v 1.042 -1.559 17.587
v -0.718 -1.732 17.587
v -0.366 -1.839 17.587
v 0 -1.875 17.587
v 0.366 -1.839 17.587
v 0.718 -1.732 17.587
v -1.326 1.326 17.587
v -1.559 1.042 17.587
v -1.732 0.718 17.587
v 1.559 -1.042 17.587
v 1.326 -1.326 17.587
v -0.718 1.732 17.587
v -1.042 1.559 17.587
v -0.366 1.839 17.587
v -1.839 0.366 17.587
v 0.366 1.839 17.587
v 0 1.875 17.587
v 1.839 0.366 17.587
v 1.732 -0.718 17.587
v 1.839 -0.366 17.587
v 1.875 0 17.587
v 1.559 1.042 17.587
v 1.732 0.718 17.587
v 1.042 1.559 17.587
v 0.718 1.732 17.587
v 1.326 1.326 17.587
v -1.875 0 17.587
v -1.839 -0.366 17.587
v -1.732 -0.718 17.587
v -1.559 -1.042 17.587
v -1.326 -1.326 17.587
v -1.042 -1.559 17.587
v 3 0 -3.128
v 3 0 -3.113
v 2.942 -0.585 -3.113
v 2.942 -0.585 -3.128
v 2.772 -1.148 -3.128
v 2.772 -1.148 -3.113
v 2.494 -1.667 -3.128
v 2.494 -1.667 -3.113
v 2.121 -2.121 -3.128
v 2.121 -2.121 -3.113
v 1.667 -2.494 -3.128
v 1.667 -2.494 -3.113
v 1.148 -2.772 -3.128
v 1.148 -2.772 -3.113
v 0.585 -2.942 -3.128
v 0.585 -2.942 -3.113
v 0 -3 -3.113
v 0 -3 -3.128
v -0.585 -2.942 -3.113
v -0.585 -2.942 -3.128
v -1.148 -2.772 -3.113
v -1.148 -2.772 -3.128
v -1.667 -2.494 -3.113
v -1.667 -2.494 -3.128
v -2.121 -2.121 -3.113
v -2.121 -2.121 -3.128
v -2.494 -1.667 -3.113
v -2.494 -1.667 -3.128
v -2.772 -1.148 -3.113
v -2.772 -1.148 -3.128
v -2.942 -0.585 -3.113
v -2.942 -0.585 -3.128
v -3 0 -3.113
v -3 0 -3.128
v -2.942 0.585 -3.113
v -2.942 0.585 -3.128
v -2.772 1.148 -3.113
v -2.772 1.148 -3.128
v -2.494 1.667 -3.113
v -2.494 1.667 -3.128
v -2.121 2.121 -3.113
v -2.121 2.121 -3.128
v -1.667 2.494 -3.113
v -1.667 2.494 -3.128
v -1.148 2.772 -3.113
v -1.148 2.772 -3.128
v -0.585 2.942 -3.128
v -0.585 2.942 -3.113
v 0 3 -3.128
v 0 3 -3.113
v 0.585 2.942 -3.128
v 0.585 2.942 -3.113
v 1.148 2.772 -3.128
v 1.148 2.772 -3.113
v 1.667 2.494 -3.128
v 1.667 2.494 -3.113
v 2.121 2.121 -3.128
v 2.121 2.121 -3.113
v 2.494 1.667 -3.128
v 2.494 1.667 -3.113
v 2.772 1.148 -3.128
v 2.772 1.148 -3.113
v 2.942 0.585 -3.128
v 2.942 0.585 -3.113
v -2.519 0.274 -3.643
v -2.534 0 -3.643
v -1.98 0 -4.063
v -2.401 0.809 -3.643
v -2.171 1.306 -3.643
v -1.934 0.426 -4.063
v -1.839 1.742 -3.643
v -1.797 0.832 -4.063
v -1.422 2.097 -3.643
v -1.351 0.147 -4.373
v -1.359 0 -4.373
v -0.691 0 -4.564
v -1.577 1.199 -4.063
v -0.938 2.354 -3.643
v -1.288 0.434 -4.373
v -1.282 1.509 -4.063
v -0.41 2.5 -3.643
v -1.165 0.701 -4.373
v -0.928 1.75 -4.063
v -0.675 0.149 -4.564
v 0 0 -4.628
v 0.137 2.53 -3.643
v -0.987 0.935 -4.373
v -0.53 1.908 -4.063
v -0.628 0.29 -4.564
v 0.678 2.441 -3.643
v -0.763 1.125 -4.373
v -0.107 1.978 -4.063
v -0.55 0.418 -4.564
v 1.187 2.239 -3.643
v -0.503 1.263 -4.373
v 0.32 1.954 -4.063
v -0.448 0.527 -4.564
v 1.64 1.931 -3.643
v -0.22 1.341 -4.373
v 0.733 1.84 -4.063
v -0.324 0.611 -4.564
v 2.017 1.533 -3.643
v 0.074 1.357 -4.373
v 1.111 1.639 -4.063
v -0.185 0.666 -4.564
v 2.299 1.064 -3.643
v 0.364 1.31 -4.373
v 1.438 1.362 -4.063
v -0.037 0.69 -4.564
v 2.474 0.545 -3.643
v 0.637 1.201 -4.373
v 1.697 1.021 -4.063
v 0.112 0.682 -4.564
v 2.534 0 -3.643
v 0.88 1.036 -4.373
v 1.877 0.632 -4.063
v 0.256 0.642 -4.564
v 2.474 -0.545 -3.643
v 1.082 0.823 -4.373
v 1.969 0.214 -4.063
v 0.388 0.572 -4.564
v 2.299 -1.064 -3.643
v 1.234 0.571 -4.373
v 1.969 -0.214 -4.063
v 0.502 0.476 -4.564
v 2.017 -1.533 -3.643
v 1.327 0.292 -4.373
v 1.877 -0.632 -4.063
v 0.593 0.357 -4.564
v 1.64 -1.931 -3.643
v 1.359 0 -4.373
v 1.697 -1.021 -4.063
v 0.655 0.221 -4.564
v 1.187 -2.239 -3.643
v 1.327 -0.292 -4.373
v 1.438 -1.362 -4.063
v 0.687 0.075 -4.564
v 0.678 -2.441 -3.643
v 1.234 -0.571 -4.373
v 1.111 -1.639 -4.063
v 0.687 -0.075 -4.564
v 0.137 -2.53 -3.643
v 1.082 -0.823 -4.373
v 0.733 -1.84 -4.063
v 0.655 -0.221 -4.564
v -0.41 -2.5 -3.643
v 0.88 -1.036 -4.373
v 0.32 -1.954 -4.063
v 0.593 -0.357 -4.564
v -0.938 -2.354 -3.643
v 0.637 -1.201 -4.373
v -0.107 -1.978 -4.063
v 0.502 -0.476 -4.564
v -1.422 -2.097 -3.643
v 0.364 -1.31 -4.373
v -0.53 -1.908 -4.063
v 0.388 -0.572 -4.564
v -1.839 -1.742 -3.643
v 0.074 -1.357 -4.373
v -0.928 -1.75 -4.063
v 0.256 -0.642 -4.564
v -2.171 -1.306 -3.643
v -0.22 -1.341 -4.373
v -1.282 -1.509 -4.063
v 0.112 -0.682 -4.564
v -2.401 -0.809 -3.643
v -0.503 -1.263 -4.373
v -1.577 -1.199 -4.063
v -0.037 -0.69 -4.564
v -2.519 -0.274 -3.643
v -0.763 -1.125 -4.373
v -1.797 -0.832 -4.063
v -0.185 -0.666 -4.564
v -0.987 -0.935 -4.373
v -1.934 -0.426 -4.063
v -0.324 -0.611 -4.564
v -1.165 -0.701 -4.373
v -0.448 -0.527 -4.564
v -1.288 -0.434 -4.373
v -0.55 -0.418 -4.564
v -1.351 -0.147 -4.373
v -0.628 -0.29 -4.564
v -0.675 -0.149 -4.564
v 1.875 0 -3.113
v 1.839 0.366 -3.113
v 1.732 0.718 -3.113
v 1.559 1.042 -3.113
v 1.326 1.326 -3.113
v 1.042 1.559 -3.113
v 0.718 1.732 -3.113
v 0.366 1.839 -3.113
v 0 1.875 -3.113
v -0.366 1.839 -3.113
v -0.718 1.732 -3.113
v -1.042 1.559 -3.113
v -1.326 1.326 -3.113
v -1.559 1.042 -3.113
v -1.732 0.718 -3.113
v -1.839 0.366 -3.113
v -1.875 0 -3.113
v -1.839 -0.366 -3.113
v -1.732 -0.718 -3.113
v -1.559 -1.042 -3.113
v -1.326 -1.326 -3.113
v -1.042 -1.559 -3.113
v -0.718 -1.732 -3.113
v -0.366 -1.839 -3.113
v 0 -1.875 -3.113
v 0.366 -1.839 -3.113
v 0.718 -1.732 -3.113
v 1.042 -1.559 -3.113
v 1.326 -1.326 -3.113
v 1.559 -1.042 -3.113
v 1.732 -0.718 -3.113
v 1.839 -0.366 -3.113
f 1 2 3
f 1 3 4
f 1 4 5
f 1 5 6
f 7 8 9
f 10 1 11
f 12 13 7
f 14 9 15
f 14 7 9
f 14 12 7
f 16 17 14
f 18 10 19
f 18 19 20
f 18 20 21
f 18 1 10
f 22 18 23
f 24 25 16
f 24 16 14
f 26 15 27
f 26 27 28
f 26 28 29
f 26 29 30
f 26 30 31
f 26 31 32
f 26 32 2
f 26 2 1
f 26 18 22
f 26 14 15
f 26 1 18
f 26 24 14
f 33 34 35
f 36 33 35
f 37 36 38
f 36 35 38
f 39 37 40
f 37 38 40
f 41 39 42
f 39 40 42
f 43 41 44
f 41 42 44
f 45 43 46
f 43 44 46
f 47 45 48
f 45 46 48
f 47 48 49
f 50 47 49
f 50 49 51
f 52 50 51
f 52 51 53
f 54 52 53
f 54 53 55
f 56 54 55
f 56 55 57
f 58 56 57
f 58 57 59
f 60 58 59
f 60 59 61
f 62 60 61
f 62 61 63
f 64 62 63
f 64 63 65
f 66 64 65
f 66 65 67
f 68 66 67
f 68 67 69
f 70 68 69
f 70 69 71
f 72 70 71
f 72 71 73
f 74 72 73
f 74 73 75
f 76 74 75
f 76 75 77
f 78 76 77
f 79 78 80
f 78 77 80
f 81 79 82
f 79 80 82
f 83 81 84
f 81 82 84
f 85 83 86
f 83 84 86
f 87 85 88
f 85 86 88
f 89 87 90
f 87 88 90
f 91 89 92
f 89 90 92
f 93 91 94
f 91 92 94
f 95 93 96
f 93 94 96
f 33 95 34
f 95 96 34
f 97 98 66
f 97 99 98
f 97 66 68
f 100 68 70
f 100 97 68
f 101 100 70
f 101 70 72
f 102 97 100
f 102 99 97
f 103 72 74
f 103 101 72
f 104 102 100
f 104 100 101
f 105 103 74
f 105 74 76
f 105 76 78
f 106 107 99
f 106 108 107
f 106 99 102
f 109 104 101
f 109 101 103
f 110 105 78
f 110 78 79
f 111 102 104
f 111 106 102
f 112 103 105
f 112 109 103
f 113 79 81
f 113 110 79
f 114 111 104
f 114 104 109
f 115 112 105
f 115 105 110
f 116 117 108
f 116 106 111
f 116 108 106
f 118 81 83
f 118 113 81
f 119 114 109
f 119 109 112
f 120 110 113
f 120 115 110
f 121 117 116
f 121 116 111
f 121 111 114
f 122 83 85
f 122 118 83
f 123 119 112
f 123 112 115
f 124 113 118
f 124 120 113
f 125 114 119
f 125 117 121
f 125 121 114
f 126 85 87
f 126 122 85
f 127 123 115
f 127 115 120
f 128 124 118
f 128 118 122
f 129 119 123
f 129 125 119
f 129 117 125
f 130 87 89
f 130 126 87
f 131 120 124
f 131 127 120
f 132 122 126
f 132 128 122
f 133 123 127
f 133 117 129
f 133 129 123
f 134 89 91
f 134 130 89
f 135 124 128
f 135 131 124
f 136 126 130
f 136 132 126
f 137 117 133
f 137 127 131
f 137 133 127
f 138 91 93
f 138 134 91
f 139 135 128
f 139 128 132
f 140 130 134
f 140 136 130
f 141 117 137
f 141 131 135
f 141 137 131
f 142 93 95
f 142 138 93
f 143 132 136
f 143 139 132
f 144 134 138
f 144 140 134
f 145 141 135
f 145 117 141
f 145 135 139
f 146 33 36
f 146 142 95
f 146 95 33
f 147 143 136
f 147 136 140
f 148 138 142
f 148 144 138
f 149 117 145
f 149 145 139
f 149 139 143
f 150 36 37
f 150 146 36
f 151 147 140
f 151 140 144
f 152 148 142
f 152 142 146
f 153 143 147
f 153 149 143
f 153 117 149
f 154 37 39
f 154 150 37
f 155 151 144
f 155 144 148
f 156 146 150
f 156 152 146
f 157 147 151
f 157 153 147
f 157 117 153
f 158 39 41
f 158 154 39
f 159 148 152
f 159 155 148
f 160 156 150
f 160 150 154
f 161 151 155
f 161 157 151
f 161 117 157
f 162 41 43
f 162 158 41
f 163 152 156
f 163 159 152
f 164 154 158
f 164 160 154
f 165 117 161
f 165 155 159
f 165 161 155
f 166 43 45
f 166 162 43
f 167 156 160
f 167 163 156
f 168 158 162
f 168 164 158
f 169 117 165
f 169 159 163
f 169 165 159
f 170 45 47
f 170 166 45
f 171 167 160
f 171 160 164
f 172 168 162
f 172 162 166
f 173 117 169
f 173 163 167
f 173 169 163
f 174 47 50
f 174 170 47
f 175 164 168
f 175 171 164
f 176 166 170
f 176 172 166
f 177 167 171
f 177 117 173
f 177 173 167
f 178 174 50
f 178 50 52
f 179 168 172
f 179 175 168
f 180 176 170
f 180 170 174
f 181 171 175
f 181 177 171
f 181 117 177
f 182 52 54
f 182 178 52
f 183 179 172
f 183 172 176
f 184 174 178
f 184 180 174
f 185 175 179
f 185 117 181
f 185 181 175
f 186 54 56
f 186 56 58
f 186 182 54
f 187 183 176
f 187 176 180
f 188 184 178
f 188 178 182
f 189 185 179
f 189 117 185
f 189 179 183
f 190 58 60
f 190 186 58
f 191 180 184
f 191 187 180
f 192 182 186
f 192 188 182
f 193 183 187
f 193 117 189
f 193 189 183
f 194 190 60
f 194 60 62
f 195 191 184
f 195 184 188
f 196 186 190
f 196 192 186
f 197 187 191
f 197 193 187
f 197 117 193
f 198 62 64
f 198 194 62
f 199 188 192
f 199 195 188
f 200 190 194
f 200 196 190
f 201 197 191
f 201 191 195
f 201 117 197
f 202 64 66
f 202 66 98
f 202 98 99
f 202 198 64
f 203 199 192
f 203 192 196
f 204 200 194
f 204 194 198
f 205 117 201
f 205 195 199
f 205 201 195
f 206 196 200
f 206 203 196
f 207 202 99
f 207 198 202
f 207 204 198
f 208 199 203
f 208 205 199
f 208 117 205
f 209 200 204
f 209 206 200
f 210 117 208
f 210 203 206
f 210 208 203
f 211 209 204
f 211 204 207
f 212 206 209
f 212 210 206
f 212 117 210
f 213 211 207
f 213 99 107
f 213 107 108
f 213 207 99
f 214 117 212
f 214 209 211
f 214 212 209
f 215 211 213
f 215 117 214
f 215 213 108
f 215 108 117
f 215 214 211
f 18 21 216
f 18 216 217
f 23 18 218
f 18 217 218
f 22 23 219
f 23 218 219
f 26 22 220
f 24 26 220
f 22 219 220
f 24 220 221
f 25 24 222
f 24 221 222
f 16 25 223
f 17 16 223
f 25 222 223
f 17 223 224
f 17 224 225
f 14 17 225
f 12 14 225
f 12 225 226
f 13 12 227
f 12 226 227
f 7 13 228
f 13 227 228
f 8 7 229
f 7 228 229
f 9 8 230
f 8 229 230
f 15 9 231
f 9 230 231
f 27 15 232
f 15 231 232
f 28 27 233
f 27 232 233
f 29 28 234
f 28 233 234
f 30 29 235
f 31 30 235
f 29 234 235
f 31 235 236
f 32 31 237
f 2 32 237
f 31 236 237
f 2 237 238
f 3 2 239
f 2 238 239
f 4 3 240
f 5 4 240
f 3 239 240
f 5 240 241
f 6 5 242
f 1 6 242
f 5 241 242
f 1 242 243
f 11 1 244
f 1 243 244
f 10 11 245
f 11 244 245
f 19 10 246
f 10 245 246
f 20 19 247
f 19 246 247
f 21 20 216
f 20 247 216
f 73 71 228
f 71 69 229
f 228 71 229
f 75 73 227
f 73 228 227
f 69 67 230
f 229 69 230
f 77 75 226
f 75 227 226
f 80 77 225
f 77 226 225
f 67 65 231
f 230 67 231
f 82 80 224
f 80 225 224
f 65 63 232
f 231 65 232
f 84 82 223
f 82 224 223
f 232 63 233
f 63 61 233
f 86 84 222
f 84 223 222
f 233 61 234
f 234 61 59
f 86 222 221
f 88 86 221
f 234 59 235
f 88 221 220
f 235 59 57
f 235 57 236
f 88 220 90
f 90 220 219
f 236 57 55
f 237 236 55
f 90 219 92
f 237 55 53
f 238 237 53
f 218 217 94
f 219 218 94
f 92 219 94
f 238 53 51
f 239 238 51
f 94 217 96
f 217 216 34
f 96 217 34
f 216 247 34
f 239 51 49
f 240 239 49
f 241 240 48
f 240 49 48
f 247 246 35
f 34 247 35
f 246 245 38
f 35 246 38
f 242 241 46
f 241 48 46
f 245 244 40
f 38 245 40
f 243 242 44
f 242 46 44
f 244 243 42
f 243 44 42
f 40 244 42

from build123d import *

# Parameters (mm, degrees)
SKETCH1_R           = 1.25
BOSS_EXTRUDE1_DEPTH = 13.8
SKETCH3_R           = 2
BOSS_EXTRUDE2_DEPTH = 0.01
DOME1_FACE_RADIUS   = 2
DOME1_HEIGHT        = 1
SCALE1_SCALE        = 1.5


with BuildPart() as part:
    # Sketch1 → Boss-Extrude1 (new body)
    with BuildSketch(Plane.XY):
        Circle(SKETCH1_R)
    extrude(amount=BOSS_EXTRUDE1_DEPTH)

    # Sketch3 → Boss-Extrude2 (add)
    with BuildSketch(Plane(origin=(0, 0, 0), x_dir=(-1, 0, 0), z_dir=(0, 0, -1))):
        with Locations(Location((0, 0, 0), (0, 0, 180))):
            Circle(SKETCH3_R)
    extrude(amount=BOSS_EXTRUDE2_DEPTH)

    # Dome1: a dome of height H over a round flat face of radius A is a cap of a sphere of radius (A * A + H * H) / (2 * H)
    dome1_r = (DOME1_FACE_RADIUS * DOME1_FACE_RADIUS + DOME1_HEIGHT * DOME1_HEIGHT) / (2 * DOME1_HEIGHT)
    dome1_base = Plane((0, 0, -0.01), z_dir=(0, 0, -1))
    with Locations(dome1_base.offset(DOME1_HEIGHT - dome1_r)):
        dome1_ball = Sphere(dome1_r, mode=Mode.PRIVATE)
    add(split(dome1_ball, bisect_by=dome1_base, keep=Keep.TOP, mode=Mode.PRIVATE))


with BuildPart() as part_1:
    # Scale1: scaled about (0, 0, 6.226948778)
    add(part.part.scale(SCALE1_SCALE).moved(Location((0, 0, -3.113474389))))


solid = part_1.part
